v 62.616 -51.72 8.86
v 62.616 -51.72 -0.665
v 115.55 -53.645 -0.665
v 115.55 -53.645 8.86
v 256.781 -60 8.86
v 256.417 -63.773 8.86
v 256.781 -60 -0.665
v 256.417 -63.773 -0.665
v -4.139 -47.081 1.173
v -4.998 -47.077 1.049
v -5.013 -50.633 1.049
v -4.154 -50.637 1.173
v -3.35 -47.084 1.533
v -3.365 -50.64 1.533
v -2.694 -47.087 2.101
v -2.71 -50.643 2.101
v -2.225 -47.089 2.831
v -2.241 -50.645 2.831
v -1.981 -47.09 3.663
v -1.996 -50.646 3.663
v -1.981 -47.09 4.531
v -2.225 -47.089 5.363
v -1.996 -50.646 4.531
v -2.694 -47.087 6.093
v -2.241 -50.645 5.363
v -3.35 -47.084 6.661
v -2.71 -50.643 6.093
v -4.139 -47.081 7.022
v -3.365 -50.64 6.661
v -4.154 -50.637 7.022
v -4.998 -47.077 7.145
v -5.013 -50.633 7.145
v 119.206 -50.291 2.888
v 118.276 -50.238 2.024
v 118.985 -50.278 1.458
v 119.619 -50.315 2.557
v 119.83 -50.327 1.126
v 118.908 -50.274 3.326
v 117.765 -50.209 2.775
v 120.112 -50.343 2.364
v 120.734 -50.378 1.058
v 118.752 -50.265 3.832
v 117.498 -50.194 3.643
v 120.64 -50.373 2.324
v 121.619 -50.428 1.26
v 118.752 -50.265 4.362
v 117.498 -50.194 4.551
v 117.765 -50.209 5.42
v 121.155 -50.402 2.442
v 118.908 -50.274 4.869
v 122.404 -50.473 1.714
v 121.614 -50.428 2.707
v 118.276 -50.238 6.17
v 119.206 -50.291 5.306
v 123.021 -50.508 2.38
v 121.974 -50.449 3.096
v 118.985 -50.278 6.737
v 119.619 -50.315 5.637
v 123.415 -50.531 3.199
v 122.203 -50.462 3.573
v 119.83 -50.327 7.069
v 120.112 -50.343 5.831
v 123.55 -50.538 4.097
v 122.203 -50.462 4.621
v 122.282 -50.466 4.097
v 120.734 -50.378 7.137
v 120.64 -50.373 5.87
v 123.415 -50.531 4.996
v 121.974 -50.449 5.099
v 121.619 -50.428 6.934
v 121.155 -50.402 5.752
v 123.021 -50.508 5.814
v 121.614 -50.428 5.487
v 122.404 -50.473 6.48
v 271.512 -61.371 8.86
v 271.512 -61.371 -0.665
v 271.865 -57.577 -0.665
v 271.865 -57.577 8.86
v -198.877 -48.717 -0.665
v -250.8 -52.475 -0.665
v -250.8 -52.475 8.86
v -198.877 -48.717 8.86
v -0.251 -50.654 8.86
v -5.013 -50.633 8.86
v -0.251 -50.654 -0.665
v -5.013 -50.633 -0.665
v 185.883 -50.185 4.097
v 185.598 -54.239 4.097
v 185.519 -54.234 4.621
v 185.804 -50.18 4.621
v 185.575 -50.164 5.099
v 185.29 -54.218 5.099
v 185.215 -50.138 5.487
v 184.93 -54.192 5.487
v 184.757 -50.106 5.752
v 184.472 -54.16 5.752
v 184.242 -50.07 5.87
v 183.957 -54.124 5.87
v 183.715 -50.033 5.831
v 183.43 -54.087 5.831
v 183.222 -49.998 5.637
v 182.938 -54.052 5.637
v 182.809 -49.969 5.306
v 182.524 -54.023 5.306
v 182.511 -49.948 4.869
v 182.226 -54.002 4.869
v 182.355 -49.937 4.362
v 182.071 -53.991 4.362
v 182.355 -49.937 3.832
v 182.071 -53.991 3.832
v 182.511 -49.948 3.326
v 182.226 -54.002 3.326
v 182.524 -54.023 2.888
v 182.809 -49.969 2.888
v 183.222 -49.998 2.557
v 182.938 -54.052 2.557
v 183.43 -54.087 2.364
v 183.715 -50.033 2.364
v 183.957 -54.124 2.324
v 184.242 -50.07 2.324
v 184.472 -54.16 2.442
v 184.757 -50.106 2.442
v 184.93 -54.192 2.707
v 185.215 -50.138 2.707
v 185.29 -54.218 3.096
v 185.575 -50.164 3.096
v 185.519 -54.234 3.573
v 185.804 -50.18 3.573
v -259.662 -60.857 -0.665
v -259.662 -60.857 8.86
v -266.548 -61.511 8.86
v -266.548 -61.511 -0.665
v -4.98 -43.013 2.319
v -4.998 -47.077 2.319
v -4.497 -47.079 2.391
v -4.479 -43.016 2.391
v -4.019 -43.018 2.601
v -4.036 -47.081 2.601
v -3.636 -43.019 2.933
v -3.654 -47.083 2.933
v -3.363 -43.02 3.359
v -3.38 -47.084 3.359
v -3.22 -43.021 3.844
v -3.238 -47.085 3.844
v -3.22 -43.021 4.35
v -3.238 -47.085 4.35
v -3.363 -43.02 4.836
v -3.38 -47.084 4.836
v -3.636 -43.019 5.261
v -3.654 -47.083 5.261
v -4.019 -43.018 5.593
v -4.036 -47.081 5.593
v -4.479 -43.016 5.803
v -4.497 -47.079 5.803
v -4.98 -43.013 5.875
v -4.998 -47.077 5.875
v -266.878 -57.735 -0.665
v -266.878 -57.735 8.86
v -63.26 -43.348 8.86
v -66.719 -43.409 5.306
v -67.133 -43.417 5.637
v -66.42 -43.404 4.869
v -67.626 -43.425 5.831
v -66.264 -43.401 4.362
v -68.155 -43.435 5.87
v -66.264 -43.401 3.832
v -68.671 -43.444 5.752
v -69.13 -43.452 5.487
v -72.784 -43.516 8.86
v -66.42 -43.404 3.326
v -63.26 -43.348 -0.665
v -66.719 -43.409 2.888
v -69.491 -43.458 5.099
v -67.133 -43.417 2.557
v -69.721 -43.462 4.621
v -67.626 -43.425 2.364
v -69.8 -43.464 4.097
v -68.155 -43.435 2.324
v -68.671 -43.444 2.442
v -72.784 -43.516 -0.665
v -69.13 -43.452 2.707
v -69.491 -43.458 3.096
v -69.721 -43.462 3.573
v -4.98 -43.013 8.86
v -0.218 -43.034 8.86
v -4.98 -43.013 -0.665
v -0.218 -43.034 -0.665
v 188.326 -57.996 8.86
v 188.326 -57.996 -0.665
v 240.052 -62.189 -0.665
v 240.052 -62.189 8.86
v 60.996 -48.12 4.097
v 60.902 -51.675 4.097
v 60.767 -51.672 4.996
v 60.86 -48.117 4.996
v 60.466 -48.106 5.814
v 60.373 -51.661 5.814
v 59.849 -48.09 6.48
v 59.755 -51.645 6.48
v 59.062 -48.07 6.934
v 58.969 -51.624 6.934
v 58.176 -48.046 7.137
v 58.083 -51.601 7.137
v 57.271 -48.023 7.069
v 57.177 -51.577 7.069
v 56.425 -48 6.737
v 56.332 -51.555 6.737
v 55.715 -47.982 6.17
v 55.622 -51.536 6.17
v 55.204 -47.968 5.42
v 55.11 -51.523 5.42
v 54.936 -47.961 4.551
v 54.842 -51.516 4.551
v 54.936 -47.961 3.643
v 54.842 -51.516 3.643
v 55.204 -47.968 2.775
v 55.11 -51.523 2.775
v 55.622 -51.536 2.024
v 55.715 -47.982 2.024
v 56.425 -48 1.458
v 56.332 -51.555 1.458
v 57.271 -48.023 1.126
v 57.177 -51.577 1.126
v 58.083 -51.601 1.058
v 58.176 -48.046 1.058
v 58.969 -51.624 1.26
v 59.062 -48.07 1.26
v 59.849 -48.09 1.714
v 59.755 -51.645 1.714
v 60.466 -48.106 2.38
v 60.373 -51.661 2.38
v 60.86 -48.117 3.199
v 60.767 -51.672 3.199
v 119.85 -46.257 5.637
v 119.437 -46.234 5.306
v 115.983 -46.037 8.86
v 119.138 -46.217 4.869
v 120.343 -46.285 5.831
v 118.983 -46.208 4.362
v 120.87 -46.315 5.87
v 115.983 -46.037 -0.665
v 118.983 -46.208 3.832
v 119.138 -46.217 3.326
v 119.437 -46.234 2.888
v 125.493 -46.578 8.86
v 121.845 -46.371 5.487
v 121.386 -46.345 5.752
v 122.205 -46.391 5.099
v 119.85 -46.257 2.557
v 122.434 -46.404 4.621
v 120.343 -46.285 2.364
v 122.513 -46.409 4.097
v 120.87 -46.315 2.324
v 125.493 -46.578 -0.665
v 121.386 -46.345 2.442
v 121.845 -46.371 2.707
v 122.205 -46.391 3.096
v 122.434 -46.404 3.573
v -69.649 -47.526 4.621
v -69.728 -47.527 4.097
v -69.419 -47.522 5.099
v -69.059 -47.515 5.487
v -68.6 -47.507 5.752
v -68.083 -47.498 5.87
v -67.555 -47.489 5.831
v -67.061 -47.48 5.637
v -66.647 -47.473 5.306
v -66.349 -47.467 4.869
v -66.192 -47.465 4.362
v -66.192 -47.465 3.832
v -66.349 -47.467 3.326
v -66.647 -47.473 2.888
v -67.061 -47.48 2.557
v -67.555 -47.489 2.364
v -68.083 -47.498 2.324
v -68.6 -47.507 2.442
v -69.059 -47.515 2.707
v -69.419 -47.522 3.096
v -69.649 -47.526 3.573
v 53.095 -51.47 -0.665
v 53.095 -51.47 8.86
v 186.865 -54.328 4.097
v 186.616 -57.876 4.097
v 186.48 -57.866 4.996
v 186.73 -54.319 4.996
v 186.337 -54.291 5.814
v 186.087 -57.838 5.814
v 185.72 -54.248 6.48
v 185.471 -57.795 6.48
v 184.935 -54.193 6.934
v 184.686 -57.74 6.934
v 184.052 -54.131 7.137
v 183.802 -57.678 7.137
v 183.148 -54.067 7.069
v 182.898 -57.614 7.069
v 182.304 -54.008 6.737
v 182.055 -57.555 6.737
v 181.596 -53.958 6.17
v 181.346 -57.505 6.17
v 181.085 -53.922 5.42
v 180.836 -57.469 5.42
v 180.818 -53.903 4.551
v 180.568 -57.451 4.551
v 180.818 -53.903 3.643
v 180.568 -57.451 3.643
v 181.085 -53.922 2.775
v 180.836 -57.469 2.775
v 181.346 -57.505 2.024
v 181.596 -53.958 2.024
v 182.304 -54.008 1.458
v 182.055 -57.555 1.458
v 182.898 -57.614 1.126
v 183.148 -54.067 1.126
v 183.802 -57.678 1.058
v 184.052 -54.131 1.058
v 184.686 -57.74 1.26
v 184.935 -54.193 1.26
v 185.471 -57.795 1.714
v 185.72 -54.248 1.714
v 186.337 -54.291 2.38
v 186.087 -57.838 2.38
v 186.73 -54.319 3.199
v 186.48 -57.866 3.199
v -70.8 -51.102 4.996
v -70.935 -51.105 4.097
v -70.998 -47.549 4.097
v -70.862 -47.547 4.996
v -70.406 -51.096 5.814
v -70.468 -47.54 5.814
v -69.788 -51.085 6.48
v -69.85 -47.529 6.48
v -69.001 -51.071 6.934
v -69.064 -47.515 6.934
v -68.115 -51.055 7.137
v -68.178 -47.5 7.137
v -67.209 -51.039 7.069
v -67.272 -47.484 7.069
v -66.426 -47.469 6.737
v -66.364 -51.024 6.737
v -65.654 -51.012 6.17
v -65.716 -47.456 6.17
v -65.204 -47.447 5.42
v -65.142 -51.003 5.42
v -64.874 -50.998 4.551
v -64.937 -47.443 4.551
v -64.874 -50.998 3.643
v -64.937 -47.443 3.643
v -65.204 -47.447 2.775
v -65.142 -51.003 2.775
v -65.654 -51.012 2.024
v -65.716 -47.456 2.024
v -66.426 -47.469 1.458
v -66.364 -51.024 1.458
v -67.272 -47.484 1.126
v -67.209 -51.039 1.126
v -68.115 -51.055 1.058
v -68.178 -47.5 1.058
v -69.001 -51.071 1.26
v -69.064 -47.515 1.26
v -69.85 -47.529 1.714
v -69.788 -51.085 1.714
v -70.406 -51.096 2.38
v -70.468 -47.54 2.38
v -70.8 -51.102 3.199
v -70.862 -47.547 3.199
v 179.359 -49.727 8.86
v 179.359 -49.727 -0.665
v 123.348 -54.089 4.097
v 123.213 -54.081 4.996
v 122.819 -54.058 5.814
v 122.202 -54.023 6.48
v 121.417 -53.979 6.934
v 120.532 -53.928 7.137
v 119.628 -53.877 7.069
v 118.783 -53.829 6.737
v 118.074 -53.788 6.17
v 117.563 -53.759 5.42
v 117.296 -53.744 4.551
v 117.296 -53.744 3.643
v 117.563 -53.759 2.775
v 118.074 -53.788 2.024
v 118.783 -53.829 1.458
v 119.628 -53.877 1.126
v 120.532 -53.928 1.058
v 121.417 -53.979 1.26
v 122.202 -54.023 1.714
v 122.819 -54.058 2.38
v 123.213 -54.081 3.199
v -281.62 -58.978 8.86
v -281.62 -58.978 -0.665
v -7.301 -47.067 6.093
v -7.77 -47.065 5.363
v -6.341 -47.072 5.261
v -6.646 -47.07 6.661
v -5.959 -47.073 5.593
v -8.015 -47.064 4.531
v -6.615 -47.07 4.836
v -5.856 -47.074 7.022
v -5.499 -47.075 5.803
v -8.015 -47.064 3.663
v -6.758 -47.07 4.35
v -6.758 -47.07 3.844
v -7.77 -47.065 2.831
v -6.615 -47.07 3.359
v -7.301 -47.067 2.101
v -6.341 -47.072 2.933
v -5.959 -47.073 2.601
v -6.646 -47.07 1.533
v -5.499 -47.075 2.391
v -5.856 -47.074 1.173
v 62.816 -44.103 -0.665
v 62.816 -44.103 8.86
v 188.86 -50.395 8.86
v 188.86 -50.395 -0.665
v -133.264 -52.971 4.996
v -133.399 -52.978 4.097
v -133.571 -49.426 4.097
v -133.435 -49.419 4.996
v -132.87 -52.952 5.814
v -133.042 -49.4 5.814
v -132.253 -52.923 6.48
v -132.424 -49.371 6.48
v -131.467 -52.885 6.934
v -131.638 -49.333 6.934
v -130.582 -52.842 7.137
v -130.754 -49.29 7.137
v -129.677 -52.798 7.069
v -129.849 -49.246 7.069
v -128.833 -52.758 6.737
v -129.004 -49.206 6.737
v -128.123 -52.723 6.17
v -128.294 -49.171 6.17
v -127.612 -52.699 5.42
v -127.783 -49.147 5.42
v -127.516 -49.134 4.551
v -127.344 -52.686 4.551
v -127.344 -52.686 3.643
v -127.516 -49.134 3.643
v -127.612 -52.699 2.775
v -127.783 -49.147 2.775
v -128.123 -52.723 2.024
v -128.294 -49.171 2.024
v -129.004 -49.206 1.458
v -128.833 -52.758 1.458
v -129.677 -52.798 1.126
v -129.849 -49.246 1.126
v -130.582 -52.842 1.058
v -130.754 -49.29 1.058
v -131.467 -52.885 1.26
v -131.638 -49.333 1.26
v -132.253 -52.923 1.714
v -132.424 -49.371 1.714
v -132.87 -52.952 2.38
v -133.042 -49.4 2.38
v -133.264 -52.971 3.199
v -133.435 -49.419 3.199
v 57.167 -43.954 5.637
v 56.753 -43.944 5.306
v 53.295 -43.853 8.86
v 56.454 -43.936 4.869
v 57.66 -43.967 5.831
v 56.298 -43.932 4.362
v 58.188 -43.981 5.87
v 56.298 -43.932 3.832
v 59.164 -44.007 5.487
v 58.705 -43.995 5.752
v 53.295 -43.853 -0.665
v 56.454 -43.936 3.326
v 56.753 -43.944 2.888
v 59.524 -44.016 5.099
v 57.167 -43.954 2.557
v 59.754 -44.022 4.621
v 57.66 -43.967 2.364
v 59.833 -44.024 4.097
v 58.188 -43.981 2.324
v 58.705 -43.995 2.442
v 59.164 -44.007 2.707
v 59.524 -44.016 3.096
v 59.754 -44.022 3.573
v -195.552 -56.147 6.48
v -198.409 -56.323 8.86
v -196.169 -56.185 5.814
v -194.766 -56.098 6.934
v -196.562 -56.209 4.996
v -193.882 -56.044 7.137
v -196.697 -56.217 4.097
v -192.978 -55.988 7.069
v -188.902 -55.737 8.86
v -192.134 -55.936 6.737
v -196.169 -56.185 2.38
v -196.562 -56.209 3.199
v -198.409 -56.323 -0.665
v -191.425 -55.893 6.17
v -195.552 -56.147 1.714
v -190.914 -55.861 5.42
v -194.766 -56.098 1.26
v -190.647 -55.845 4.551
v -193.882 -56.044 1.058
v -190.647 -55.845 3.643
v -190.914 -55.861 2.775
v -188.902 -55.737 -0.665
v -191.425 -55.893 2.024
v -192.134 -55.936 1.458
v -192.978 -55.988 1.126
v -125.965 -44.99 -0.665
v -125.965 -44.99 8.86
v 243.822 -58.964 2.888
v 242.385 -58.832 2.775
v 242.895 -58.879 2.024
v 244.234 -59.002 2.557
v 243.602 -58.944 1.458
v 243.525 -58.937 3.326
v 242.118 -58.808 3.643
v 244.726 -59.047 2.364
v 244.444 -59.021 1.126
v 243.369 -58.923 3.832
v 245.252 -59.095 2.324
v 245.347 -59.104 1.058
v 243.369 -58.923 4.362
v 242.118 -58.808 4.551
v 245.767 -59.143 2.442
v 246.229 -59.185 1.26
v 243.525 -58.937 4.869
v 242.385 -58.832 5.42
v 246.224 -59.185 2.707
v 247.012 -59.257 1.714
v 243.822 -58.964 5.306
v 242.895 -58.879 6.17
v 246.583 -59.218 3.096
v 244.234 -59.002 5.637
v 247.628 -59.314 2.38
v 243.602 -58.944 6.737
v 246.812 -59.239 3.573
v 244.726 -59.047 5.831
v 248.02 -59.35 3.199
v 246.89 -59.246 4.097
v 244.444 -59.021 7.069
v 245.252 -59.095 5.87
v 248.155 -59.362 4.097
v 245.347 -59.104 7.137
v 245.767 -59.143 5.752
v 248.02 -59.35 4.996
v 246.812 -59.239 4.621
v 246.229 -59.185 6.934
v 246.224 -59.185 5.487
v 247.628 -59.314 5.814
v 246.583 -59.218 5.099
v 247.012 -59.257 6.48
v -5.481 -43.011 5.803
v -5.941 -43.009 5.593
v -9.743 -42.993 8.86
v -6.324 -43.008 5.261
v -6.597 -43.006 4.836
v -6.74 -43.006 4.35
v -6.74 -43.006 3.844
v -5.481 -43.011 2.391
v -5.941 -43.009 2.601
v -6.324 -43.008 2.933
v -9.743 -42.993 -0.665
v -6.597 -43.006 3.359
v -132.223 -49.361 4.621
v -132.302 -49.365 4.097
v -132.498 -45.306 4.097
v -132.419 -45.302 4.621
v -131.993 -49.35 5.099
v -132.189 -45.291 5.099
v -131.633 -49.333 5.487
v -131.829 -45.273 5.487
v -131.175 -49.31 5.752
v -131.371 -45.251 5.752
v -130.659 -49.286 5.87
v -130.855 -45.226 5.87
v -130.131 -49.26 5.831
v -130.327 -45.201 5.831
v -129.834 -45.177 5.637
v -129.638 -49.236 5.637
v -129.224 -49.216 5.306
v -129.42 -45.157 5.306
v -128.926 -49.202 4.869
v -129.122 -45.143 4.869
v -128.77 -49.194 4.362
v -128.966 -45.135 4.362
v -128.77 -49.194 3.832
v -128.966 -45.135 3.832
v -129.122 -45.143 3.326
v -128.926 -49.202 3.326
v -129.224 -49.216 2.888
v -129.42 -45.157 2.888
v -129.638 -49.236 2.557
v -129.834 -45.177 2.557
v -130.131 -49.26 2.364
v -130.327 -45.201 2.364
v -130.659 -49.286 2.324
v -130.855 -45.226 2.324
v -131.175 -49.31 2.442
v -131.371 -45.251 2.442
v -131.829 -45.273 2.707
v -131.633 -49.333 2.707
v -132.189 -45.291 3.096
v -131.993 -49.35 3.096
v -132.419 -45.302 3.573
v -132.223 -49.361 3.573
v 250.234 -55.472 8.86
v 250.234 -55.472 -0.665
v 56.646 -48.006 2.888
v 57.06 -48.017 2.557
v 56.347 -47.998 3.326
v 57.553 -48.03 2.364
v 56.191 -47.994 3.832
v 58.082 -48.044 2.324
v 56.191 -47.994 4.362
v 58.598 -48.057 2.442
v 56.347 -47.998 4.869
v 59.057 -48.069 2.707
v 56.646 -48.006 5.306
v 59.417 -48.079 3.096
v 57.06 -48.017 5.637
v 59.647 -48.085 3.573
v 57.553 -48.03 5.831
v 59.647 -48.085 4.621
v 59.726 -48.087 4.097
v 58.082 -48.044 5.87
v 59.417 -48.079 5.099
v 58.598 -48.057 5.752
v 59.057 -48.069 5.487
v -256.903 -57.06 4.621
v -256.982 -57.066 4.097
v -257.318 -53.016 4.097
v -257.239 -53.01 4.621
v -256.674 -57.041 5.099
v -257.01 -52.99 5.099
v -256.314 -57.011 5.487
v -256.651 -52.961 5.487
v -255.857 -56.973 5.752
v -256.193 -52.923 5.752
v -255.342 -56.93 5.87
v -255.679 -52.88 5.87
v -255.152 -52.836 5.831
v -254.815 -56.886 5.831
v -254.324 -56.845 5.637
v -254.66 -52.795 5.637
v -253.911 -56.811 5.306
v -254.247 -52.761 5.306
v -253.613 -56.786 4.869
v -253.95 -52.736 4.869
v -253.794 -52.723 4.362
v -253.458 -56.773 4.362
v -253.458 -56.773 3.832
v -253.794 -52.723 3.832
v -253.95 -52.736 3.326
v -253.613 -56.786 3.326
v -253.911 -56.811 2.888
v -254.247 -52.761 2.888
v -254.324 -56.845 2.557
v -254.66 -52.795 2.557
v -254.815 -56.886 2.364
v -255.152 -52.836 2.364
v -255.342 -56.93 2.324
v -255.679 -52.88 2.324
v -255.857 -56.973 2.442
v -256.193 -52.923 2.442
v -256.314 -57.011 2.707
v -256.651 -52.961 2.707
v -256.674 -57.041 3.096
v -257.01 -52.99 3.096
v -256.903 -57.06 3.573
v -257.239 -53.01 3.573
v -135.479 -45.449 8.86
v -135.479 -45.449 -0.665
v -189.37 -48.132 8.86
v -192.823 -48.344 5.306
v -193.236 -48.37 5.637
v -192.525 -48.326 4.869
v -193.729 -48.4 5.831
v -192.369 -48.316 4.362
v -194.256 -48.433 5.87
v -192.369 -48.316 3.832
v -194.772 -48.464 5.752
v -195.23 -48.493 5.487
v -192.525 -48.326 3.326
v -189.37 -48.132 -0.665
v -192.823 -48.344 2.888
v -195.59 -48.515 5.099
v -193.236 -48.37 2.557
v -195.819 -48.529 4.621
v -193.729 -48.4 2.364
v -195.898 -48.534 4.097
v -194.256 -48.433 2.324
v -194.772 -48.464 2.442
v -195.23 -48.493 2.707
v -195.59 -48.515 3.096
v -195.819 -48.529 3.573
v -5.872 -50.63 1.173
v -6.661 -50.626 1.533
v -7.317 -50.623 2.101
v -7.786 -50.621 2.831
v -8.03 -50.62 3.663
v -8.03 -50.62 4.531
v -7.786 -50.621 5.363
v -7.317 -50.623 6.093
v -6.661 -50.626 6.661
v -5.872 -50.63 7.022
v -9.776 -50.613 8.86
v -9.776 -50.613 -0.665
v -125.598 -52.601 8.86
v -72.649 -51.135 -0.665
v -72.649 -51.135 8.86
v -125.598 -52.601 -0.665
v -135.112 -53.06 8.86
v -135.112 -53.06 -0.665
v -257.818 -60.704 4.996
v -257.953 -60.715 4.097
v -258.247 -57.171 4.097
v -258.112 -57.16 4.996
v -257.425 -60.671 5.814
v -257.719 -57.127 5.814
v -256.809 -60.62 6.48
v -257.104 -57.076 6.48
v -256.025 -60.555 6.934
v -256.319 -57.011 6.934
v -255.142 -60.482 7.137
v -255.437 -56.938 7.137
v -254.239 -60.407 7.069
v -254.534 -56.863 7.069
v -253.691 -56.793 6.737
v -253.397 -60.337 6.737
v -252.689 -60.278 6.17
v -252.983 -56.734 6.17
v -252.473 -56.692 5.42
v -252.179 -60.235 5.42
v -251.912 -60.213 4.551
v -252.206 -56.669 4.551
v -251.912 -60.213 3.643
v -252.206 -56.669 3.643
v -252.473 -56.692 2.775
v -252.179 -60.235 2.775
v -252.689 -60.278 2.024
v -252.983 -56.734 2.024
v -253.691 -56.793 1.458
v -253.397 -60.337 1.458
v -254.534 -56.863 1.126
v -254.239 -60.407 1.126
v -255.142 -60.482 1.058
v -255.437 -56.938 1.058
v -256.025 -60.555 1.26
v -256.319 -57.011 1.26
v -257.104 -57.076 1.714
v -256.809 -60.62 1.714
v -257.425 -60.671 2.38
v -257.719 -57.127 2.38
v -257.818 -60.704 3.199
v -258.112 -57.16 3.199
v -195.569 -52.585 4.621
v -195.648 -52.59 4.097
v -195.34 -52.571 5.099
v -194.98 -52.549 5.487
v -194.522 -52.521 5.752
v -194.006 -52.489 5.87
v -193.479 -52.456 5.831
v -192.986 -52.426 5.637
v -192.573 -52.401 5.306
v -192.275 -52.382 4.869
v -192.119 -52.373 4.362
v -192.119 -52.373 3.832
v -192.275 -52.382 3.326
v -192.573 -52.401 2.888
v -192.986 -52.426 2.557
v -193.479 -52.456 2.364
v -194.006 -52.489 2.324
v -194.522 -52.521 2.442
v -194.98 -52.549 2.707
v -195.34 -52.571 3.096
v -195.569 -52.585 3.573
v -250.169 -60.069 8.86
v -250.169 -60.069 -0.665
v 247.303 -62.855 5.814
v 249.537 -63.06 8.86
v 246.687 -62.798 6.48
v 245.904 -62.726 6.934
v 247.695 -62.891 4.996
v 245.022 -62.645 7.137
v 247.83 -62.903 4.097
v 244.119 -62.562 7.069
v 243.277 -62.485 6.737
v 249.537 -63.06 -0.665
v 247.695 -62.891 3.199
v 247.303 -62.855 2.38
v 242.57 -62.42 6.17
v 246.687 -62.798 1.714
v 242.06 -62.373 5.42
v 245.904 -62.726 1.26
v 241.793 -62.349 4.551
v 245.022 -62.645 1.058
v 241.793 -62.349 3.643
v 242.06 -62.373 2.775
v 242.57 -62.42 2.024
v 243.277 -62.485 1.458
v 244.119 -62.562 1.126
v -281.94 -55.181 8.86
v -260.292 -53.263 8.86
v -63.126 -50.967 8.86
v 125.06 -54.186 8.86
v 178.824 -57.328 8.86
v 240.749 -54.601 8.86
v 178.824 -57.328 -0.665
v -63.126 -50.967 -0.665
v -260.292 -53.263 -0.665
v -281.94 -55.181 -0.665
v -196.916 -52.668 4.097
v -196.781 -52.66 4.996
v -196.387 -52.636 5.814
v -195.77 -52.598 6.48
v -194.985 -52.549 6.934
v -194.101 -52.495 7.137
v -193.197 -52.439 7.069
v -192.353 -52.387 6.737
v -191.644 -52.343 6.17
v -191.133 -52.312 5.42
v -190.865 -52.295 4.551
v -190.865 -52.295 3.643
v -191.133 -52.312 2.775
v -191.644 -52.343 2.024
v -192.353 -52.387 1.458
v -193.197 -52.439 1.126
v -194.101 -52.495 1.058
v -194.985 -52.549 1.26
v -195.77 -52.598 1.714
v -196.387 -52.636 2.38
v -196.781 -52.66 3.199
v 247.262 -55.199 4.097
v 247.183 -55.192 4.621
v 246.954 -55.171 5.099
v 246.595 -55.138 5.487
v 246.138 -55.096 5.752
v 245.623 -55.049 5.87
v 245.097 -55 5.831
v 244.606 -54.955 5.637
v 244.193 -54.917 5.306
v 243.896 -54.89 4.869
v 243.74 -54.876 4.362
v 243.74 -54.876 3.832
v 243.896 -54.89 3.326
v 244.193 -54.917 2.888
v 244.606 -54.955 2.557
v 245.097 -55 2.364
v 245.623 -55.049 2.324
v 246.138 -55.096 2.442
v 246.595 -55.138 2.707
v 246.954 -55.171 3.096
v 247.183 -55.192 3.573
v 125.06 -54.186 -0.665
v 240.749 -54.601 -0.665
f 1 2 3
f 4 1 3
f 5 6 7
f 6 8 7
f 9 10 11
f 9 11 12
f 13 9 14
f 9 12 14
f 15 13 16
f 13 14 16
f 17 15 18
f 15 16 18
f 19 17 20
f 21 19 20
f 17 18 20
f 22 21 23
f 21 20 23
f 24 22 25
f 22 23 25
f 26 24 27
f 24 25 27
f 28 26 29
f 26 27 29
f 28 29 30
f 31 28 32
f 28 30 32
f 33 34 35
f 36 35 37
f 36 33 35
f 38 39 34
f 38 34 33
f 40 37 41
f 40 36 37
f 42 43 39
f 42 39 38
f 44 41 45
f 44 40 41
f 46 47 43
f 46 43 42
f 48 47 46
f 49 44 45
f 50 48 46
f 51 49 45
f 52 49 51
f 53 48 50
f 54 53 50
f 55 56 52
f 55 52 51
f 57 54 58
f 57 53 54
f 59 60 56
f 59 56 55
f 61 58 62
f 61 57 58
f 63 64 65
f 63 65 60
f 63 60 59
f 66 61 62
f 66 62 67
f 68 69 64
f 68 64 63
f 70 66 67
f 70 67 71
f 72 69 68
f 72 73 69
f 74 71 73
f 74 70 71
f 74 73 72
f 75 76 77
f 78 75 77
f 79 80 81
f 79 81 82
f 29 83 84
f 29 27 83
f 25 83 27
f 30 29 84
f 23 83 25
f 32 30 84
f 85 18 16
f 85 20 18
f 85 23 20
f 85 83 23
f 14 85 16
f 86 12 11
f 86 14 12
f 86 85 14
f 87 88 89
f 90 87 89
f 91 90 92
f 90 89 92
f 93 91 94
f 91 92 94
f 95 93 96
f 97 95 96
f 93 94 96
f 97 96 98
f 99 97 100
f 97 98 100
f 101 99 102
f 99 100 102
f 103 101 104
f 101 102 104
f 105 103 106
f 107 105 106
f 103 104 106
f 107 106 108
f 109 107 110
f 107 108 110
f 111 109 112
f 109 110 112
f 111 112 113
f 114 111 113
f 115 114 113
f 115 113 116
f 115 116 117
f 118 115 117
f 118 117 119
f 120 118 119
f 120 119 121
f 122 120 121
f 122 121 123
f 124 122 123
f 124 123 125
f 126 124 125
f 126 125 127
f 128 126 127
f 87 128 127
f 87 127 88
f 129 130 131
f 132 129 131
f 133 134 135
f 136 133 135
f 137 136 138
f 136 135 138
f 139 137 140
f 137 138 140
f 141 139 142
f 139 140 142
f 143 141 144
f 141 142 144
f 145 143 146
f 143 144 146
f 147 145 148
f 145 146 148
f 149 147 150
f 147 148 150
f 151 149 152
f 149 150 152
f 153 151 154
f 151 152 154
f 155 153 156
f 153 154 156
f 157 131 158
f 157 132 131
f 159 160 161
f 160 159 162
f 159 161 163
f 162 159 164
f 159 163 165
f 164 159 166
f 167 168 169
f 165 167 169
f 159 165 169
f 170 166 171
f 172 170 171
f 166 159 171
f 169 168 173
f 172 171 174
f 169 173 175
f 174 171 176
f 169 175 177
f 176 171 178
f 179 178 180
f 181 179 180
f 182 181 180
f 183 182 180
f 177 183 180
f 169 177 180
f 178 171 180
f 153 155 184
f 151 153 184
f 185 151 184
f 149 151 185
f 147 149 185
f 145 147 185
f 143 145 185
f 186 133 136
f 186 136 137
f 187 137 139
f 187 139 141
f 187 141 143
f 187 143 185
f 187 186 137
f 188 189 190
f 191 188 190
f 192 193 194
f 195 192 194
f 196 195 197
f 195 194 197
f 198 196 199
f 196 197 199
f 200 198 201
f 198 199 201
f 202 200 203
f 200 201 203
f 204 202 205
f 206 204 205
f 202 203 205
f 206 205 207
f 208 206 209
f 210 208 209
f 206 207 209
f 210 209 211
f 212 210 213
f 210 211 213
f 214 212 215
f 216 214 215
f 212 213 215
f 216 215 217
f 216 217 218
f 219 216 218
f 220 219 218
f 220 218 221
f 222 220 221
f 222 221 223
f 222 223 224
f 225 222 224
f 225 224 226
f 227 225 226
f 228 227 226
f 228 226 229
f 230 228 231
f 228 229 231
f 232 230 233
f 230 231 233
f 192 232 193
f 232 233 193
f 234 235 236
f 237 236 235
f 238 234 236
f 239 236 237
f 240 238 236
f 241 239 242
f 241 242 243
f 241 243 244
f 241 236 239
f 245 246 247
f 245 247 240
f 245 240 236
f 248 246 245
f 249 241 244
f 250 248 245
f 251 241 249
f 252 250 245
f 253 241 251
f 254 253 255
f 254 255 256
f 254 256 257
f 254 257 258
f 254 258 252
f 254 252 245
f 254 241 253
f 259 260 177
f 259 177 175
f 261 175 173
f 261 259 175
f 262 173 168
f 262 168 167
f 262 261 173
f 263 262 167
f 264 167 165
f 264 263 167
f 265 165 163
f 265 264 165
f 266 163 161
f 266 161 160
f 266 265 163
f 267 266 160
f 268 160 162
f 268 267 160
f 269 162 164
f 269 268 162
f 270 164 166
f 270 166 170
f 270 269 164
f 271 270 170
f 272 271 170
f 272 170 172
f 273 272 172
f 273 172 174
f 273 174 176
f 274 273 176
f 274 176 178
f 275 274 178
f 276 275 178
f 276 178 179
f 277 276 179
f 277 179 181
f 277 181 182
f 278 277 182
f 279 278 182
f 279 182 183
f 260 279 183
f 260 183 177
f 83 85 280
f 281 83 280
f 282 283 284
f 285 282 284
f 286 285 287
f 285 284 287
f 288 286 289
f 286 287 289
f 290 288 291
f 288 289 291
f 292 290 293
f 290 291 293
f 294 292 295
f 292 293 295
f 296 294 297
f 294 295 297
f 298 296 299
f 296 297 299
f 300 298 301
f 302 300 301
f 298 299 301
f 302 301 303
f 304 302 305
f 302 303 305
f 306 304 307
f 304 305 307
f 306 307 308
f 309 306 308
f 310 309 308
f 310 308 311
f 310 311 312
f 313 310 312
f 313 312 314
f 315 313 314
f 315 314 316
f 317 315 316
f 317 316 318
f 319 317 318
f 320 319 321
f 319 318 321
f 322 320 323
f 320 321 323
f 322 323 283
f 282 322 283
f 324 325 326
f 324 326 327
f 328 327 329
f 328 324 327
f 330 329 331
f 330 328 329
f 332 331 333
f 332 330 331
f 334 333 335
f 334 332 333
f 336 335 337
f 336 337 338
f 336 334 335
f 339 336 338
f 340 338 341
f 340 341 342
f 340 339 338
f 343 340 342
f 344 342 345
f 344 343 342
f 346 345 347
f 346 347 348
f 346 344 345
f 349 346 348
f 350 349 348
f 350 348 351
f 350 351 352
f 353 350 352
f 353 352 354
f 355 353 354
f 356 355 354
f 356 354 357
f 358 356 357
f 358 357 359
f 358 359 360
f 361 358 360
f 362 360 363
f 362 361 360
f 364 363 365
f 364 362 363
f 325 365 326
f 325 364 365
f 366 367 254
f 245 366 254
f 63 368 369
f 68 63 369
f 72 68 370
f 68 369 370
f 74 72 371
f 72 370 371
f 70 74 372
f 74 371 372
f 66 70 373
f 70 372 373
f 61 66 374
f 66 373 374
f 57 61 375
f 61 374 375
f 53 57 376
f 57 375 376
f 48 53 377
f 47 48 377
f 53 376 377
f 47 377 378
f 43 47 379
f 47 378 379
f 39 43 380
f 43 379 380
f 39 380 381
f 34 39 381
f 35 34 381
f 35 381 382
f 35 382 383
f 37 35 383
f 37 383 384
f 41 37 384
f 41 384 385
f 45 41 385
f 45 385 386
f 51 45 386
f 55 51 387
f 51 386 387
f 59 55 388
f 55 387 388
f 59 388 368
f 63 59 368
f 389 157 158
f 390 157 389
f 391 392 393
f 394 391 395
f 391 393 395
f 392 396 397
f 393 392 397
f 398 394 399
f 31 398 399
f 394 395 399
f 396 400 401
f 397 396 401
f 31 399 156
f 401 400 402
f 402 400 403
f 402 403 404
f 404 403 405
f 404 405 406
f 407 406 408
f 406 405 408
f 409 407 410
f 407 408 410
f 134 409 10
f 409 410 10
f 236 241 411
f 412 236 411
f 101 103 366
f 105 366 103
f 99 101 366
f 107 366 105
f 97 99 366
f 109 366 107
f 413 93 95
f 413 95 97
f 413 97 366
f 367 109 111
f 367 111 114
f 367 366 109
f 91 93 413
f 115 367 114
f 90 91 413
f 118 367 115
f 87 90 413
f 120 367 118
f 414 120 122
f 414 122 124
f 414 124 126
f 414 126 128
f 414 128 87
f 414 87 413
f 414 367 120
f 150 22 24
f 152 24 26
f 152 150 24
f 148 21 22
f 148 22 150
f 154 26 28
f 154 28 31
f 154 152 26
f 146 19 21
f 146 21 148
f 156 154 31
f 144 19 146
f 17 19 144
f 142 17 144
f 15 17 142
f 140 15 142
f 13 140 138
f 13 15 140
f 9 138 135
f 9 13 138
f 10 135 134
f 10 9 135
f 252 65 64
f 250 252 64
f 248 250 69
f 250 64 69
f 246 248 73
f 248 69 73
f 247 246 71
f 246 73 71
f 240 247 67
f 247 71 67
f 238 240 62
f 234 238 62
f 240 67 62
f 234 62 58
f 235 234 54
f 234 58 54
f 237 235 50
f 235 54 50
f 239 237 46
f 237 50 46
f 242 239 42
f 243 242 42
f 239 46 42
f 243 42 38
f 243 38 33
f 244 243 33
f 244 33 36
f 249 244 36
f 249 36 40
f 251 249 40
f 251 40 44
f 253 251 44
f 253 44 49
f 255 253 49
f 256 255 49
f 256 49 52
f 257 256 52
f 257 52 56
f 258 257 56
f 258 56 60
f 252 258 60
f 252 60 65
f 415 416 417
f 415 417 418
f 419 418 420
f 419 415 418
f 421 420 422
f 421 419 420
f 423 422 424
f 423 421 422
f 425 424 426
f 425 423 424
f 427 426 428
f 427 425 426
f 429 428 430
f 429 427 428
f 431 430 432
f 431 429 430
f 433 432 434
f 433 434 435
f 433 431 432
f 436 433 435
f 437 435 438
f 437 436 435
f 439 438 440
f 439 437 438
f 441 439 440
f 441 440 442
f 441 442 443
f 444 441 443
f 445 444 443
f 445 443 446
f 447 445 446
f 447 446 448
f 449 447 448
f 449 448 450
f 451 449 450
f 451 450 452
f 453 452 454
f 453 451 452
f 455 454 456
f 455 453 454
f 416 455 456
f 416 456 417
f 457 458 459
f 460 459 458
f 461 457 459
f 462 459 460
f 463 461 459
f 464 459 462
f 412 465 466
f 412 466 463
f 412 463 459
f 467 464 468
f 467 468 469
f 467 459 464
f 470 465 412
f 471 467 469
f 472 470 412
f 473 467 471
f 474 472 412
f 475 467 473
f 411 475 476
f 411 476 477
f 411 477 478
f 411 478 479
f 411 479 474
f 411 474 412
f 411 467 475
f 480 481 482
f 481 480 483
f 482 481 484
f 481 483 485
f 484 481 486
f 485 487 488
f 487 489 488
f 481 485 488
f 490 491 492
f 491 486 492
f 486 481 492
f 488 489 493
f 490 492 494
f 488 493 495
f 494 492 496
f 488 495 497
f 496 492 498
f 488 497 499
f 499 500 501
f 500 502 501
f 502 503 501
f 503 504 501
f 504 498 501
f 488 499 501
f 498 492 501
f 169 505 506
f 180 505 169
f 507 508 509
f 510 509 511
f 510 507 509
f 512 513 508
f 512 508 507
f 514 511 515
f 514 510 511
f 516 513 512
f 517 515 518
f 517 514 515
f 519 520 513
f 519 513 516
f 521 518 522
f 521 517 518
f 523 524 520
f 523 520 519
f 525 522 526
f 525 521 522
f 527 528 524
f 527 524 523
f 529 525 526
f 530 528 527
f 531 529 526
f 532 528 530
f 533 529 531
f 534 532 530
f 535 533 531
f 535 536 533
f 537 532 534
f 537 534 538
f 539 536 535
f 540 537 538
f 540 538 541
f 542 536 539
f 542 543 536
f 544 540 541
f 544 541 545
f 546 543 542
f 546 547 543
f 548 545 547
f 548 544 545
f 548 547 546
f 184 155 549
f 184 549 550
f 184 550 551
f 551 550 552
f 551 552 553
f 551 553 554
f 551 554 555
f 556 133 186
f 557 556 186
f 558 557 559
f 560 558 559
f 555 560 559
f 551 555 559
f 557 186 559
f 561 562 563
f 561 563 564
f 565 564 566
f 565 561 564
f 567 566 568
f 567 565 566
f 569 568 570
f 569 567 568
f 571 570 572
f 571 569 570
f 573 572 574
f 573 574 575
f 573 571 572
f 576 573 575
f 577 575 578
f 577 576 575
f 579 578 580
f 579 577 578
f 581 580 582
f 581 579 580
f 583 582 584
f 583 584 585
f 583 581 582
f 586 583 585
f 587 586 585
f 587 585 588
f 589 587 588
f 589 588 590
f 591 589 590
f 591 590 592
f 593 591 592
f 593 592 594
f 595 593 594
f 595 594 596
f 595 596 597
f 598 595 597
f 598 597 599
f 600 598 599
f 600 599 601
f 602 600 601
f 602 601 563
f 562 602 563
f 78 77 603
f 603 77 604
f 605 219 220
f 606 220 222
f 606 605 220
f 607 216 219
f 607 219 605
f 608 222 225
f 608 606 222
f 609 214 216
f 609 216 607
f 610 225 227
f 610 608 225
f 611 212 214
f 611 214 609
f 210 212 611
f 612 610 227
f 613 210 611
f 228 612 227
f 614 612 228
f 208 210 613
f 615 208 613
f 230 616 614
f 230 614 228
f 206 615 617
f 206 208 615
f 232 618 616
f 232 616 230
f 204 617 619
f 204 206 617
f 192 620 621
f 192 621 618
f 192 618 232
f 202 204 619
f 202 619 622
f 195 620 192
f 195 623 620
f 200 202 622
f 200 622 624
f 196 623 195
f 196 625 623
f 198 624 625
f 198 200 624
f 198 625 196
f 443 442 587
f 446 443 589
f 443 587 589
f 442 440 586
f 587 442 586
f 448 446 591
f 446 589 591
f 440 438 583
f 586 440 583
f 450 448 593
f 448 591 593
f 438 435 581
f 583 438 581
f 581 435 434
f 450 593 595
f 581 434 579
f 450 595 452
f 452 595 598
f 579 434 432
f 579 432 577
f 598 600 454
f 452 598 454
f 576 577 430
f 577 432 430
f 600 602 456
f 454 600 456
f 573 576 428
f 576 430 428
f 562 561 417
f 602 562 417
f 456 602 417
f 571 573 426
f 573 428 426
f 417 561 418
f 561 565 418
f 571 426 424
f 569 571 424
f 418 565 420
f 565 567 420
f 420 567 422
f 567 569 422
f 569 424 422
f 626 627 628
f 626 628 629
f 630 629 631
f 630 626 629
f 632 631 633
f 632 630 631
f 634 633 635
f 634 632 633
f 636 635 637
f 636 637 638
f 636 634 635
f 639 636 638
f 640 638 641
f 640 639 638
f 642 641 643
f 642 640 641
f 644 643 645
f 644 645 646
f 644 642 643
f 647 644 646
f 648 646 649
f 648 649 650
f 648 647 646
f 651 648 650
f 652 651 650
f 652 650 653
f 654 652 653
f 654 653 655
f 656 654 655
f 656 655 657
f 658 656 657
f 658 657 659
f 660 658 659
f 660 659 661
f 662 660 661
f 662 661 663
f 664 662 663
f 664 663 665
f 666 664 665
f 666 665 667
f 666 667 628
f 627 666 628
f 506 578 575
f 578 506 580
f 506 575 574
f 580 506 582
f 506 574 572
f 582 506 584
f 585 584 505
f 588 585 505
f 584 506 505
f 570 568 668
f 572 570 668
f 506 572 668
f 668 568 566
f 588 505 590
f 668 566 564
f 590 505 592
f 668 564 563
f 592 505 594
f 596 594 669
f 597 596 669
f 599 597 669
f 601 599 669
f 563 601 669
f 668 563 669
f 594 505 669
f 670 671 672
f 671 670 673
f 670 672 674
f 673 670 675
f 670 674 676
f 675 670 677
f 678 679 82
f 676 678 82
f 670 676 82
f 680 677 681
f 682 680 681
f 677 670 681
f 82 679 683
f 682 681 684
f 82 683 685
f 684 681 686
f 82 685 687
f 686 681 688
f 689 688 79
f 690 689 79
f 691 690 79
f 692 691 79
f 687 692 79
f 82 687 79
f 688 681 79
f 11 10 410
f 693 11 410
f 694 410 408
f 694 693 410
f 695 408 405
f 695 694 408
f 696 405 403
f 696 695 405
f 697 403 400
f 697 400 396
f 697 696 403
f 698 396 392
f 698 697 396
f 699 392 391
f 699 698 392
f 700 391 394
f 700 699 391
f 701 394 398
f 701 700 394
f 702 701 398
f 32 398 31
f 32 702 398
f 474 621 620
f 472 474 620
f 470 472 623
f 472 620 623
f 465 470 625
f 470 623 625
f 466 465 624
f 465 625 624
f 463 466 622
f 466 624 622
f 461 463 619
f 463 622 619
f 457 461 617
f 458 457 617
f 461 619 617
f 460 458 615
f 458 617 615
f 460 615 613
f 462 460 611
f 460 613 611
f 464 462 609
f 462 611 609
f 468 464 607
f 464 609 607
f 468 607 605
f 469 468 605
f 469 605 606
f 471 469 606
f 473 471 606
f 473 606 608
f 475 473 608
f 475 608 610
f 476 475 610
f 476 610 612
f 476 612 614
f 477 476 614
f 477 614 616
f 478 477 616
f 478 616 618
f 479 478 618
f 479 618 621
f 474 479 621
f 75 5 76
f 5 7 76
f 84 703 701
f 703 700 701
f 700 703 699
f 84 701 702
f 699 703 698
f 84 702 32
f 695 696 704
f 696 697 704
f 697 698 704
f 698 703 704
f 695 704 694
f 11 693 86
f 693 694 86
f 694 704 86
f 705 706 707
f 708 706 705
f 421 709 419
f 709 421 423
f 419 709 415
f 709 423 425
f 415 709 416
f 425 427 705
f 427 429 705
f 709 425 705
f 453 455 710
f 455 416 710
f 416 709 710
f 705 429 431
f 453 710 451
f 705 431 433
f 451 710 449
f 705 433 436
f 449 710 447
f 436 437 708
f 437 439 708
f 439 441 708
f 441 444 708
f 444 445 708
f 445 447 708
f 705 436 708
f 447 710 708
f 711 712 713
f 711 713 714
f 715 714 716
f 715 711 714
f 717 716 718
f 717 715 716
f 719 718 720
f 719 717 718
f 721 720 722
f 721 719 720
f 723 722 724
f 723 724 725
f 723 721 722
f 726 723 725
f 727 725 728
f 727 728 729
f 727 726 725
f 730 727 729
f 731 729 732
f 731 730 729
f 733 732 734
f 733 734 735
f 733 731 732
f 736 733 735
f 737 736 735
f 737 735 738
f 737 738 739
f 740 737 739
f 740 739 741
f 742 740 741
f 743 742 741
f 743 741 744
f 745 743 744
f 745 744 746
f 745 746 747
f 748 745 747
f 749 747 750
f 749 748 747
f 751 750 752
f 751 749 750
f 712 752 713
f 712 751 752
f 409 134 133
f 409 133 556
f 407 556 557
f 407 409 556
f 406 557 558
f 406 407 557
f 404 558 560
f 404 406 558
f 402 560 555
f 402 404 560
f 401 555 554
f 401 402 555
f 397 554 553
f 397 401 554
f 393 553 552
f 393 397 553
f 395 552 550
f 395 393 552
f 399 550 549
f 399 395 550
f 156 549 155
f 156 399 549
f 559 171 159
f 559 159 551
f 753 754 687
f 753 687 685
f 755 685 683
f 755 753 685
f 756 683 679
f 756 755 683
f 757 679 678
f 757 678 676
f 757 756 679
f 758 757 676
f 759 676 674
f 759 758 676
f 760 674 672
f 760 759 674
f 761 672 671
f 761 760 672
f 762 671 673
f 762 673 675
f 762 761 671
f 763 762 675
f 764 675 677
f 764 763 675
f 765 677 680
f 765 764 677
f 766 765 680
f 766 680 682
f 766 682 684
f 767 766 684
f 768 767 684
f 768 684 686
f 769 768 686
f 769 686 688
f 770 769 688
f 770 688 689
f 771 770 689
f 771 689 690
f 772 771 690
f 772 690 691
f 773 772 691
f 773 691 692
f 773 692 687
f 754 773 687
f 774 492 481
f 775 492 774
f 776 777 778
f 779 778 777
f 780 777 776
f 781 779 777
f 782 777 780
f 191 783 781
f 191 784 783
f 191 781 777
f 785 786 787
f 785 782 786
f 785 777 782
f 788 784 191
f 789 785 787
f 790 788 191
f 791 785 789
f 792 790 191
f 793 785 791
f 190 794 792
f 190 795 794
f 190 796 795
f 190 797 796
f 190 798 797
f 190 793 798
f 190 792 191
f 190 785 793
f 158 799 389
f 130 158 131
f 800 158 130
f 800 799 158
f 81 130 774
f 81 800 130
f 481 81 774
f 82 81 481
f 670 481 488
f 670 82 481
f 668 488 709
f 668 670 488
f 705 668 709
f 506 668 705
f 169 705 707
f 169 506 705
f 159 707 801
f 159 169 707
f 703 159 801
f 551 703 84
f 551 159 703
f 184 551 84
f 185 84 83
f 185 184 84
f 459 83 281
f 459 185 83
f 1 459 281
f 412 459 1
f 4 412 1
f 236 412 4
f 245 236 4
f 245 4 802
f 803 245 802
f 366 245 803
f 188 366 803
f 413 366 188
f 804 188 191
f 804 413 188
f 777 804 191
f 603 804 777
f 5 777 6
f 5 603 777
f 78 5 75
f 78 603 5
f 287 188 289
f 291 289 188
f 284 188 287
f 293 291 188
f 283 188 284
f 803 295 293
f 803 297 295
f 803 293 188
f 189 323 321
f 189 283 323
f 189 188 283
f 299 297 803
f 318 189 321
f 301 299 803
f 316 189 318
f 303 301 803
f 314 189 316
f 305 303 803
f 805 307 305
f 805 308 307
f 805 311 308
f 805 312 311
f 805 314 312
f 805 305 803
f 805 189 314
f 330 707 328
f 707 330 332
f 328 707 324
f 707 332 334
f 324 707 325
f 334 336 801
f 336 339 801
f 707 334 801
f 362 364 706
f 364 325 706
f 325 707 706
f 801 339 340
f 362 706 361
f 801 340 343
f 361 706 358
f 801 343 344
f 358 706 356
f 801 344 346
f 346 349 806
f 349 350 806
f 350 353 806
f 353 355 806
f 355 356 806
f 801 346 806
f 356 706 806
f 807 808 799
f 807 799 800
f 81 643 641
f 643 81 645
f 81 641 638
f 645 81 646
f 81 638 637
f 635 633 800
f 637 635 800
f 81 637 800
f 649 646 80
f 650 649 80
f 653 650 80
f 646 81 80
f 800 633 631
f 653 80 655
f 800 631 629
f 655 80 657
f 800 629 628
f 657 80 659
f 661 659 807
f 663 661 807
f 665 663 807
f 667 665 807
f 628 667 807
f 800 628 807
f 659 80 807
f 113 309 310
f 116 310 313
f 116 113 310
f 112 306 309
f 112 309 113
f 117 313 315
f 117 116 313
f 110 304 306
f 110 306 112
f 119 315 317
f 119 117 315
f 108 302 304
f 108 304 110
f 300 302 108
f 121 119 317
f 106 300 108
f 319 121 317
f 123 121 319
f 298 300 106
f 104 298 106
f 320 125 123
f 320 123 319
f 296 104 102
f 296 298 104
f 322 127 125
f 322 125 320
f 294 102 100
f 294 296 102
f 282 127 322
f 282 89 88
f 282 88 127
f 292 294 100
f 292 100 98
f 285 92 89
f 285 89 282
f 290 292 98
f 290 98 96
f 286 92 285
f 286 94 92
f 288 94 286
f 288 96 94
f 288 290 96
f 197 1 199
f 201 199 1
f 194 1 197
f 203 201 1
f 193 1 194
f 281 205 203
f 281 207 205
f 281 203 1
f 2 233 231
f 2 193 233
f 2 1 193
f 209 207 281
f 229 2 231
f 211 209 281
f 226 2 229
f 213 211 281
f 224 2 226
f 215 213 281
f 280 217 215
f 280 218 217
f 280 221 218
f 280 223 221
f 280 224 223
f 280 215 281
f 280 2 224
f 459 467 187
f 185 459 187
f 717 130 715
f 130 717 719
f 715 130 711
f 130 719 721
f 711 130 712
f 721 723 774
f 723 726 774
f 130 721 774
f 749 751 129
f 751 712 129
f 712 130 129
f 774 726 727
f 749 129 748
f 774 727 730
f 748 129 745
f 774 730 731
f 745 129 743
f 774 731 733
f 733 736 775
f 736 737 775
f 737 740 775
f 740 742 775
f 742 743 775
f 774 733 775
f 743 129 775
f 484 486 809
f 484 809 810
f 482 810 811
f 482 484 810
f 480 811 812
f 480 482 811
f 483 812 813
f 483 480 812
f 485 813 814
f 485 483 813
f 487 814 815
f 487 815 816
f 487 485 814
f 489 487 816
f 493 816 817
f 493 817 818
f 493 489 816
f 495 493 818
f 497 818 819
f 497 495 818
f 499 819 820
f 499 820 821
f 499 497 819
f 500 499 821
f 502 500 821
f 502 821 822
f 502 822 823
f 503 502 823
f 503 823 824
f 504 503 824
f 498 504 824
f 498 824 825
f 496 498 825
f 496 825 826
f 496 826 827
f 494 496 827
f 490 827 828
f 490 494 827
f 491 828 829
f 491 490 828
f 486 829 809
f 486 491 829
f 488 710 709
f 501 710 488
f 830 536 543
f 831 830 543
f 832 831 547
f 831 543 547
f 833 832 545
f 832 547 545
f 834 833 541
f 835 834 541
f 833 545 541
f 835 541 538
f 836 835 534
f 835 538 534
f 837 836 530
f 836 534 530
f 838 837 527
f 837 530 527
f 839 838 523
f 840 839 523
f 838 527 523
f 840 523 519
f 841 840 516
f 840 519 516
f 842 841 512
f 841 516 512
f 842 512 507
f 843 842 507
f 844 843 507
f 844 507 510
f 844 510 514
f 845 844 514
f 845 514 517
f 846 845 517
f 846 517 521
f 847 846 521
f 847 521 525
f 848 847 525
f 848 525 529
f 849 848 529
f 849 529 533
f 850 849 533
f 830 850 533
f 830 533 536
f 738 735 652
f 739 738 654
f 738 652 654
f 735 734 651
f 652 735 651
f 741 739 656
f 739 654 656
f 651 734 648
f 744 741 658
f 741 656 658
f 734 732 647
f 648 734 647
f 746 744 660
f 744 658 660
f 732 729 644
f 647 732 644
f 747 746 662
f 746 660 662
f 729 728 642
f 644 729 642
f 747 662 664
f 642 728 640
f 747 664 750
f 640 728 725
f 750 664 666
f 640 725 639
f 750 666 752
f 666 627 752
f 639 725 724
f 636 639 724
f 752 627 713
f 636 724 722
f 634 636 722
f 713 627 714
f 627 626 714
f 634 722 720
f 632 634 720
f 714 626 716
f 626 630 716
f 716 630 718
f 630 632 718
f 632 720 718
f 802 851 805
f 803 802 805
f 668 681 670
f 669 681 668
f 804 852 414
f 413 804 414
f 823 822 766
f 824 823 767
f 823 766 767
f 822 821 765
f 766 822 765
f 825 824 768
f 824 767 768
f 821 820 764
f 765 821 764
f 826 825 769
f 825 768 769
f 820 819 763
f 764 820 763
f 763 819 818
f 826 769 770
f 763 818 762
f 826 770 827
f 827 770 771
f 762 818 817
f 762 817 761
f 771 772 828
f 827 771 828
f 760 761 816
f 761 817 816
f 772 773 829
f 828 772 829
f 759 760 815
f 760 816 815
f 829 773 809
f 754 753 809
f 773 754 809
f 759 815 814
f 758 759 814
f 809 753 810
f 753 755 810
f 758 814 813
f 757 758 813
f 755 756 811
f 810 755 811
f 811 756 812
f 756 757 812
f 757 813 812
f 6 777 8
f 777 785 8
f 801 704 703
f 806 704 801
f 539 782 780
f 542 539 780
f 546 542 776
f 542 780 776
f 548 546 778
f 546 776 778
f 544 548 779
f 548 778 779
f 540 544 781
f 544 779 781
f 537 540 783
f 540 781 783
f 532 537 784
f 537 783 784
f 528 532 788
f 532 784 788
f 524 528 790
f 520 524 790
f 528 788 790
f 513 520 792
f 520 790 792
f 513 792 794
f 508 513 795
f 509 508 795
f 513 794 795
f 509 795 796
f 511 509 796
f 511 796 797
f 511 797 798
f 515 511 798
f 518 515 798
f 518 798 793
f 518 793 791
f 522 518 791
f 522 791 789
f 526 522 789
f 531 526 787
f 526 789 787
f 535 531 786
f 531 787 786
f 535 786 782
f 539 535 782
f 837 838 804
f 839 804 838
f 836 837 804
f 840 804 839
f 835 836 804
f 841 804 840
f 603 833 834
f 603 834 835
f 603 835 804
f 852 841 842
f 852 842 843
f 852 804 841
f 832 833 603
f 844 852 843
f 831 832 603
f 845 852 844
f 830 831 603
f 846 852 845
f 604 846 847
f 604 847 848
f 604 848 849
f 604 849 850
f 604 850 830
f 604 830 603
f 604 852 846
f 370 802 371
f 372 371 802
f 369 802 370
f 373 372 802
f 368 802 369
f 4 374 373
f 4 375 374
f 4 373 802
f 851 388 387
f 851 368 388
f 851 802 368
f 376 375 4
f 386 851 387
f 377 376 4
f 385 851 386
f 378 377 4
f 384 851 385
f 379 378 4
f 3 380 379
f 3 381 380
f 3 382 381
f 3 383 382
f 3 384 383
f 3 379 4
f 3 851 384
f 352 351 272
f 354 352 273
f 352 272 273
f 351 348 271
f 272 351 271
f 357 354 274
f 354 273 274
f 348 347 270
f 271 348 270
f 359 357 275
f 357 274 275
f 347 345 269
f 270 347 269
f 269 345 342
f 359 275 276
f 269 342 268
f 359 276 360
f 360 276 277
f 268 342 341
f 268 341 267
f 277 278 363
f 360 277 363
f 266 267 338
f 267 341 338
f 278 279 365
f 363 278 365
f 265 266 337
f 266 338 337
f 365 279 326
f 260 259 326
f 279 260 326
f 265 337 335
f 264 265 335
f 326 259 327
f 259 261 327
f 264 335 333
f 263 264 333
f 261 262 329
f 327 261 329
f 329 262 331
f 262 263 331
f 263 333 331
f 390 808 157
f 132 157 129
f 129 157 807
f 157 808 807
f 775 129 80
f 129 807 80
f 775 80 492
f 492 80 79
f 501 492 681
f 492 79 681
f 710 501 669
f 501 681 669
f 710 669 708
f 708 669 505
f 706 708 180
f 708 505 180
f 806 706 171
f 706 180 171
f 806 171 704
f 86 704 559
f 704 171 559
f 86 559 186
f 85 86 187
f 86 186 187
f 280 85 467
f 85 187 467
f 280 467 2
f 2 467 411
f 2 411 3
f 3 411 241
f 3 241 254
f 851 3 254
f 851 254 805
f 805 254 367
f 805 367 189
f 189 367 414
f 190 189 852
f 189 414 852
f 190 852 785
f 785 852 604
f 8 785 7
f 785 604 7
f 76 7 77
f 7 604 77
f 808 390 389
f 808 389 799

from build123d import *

# Parameters (mm, degrees)
BOSS_EXTRUDE1_DEPTH = 4.7625
SKETCH2_R           = 3.048
CUT_EXTRUDE1_DEPTH  = 3.556
SKETCH3_R           = 1.778
CUT_EXTRUDE2_DEPTH  = 277.706047268
SKETCH4_R           = 3.048
CUT_EXTRUDE3_DEPTH  = 3.556
SKETCH5_R           = 3.048
CUT_EXTRUDE4_DEPTH  = 3.556
SKETCH6_R           = 3.048
CUT_EXTRUDE5_DEPTH  = 3.556
SKETCH7_R           = 3.048
CUT_EXTRUDE6_DEPTH  = 3.556
SKETCH8_R           = 1.778
CUT_EXTRUDE7_DEPTH  = 273.722762612
SKETCH9_R           = 1.778
CUT_EXTRUDE8_DEPTH  = 274.775889667
SKETCH10_R          = 1.778
CUT_EXTRUDE9_DEPTH  = 276.233622552
SKETCH11_R          = 1.778
CUT_EXTRUDE10_DEPTH = 276.83087619


with BuildPart() as part:
    # Sketch1 → Boss-Extrude1 (new, symmetric)
    with BuildSketch(Plane(origin=(0, 0, 4.097149242), x_dir=(-1, 0, 0), z_dir=(0, 0, -1))):
        Polygon((0.250661746, -50.653885537), (5.013117184, -50.633283353), (4.98015369, -43.013354652), (0.217698252, -43.033956836), (-53.294657701, -43.852653014), (-62.816371972, -44.102817558), (-115.983026964, -46.037003418), (-125.492633629, -46.578303782), (-179.358518215, -49.726692243), (-188.860077886, -50.394516158), (-240.748610926, -54.601095566), (-250.233747084, -55.471622439), (-271.864542794, -57.577031547), (-271.511576408, -61.370646542), (-256.780990146, -60.000079995), (-256.417466381, -63.773158253), (-249.537325585, -63.059731366), (-240.052189426, -62.189204494), (-188.325818753, -57.995763897), (-178.824259081, -57.327939981), (-125.059593338, -54.185989113), (-115.549986674, -53.64468875), (-62.616240336, -51.720188977), (-53.094526063, -51.470024432), align=None)
    boss_extrude1 = extrude(amount=BOSS_EXTRUDE1_DEPTH, both=True)

    # Sketch2 → Cut-Extrude1 (cut)
    with BuildSketch(Plane(origin=(-3.654807803, -39.822262509, 0), x_dir=(0.995814819891653, -0.09139389741199735, 0), z_dir=(-0.09139389741199735, -0.995814819891653, 0))):
        with Locations((249.493741553, 4.097149242)):
            Circle(SKETCH2_R)
    cut_extrude1 = extrude(amount=-CUT_EXTRUDE1_DEPTH, mode=Mode.SUBTRACT)

    # Sketch3 → Cut-Extrude2 (cut, through all)
    with BuildSketch(Plane(origin=(-3.329811104, -36.28114501, 0), x_dir=(0.995814819891653, -0.09139389741199735, 0), z_dir=(-0.09139389741199735, -0.995814819891653, 0))):
        with Locations((249.493741553, 4.097149242)):
            Circle(SKETCH3_R)
    cut_extrude2 = extrude(amount=-CUT_EXTRUDE2_DEPTH, mode=Mode.SUBTRACT)

    # Sketch4 → Cut-Extrude3 (cut)
    with BuildSketch(Plane(origin=(-3.130464047, -44.539122171, 0), x_dir=(0.9975390732743608, -0.07011274699317857, 0), z_dir=(-0.07011274699317857, -0.9975390732743608, 0))):
        with Locations((187.166105034, 4.097149242)):
            Circle(SKETCH4_R)
    cut_extrude3 = extrude(amount=-CUT_EXTRUDE3_DEPTH, mode=Mode.SUBTRACT)

    # Sketch5 → Cut-Extrude4 (cut)
    with BuildSketch(Plane(origin=(-2.670492031, -46.915410629, 0), x_dir=(-0.998383901802788, 0.05682943445997907, 0), z_dir=(-0.05682943445997907, -0.9983839018027881, 0))):
        with Locations((-123.174343872, -4.097149242)):
            Circle(SKETCH5_R)
    cut_extrude4 = extrude(amount=-CUT_EXTRUDE4_DEPTH, mode=Mode.SUBTRACT)

    # Sketch6 → Cut-Extrude5 (cut)
    with BuildSketch(Plane(origin=(-1.314717641, -50.040527253, 0), x_dir=(0.9996550418058789, -0.02626399421425536, 0), z_dir=(-0.02626399421425536, -0.9996550418058789, 0))):
        with Locations((59.190519095, 4.097149242)):
            Circle(SKETCH6_R)
    cut_extrude5 = extrude(amount=-CUT_EXTRUDE5_DEPTH, mode=Mode.SUBTRACT)

    # Sketch7 → Cut-Extrude6 (cut)
    with BuildSketch(Plane(origin=(-0.219127188, -50.654021954, 0), x_dir=(-0.9999906431736124, 0.004325917847692405, 0), z_dir=(-0.004325917847692405, -0.9999906431736125, 0))):
        with Locations((4.794034853, -4.097149242)):
            Circle(SKETCH7_R)
    cut_extrude6 = extrude(amount=-CUT_EXTRUDE6_DEPTH, mode=Mode.SUBTRACT)

    # Sketch8 → Cut-Extrude7 (cut, through all)
    with BuildSketch(Plane(origin=(-0.203744224, -47.098055227, 0), x_dir=(0.9999906431736124, -0.004325917847692406, 0), z_dir=(-0.004325917847692406, -0.9999906431736125, 0))):
        with Locations((-4.794034853, 4.097149242)):
            Circle(SKETCH8_R)
    cut_extrude7 = extrude(amount=-CUT_EXTRUDE7_DEPTH, mode=Mode.SUBTRACT)

    # Sketch9 → Cut-Extrude8 (cut, through all)
    with BuildSketch(Plane(origin=(-1.221322877, -46.485753925, 0), x_dir=(0.9996550418058789, -0.02626399421425536, 0), z_dir=(-0.02626399421425536, -0.9996550418058789, 0))):
        with Locations((59.190519095, 4.097149242)):
            Circle(SKETCH9_R)
    cut_extrude8 = extrude(amount=-CUT_EXTRUDE8_DEPTH, mode=Mode.SUBTRACT)

    # Sketch10 → Cut-Extrude9 (cut, through all)
    with BuildSketch(Plane(origin=(-2.468406562, -43.365157475, 0), x_dir=(0.998383901802788, -0.05682943445997909, 0), z_dir=(-0.05682943445997909, -0.9983839018027881, 0))):
        with Locations((123.174343872, 4.097149242)):
            Circle(SKETCH10_R)
    cut_extrude9 = extrude(amount=-CUT_EXTRUDE9_DEPTH, mode=Mode.SUBTRACT)

    # Sketch11 → Cut-Extrude10 (cut, through all)
    with BuildSketch(Plane(origin=(-2.881143118, -40.991873227, 0), x_dir=(-0.9975390732743608, 0.07011274699317857, 0), z_dir=(-0.07011274699317857, -0.9975390732743608, 0))):
        with Locations((-187.166105034, -4.097149242)):
            Circle(SKETCH11_R)
    cut_extrude10 = extrude(amount=-CUT_EXTRUDE10_DEPTH, mode=Mode.SUBTRACT)

    # Mirror1: Boss-Extrude1, Cut-Extrude1, Cut-Extrude2, Cut-Extrude3, Cut-Extrude4, Cut-Extrude5, Cut-Extrude6, Cut-Extrude7, Cut-Extrude8, Cut-Extrude9, Cut-Extrude10 across plane
    add(boss_extrude1.mirror(Plane(origin=(-4.793989996, 0.020738601, 8.859649242), x_dir=(0, 0, 1), z_dir=(-0.9999906431736159, 0.004325917846891031, 0))))
    add(cut_extrude1.mirror(Plane(origin=(-4.793989996, 0.020738601, 8.859649242), x_dir=(0, 0, 1), z_dir=(-0.9999906431736159, 0.004325917846891031, 0))), mode=Mode.SUBTRACT)
    add(cut_extrude2.mirror(Plane(origin=(-4.793989996, 0.020738601, 8.859649242), x_dir=(0, 0, 1), z_dir=(-0.9999906431736159, 0.004325917846891031, 0))), mode=Mode.SUBTRACT)
    add(cut_extrude3.mirror(Plane(origin=(-4.793989996, 0.020738601, 8.859649242), x_dir=(0, 0, 1), z_dir=(-0.9999906431736159, 0.004325917846891031, 0))), mode=Mode.SUBTRACT)
    add(cut_extrude4.mirror(Plane(origin=(-4.793989996, 0.020738601, 8.859649242), x_dir=(0, 0, 1), z_dir=(-0.9999906431736159, 0.004325917846891031, 0))), mode=Mode.SUBTRACT)
    add(cut_extrude5.mirror(Plane(origin=(-4.793989996, 0.020738601, 8.859649242), x_dir=(0, 0, 1), z_dir=(-0.9999906431736159, 0.004325917846891031, 0))), mode=Mode.SUBTRACT)
    add(cut_extrude6.mirror(Plane(origin=(-4.793989996, 0.020738601, 8.859649242), x_dir=(0, 0, 1), z_dir=(-0.9999906431736159, 0.004325917846891031, 0))), mode=Mode.SUBTRACT)
    add(cut_extrude7.mirror(Plane(origin=(-4.793989996, 0.020738601, 8.859649242), x_dir=(0, 0, 1), z_dir=(-0.9999906431736159, 0.004325917846891031, 0))), mode=Mode.SUBTRACT)
    add(cut_extrude8.mirror(Plane(origin=(-4.793989996, 0.020738601, 8.859649242), x_dir=(0, 0, 1), z_dir=(-0.9999906431736159, 0.004325917846891031, 0))), mode=Mode.SUBTRACT)
    add(cut_extrude9.mirror(Plane(origin=(-4.793989996, 0.020738601, 8.859649242), x_dir=(0, 0, 1), z_dir=(-0.9999906431736159, 0.004325917846891031, 0))), mode=Mode.SUBTRACT)
    add(cut_extrude10.mirror(Plane(origin=(-4.793989996, 0.020738601, 8.859649242), x_dir=(0, 0, 1), z_dir=(-0.9999906431736159, 0.004325917846891031, 0))), mode=Mode.SUBTRACT)


solid = part.part
